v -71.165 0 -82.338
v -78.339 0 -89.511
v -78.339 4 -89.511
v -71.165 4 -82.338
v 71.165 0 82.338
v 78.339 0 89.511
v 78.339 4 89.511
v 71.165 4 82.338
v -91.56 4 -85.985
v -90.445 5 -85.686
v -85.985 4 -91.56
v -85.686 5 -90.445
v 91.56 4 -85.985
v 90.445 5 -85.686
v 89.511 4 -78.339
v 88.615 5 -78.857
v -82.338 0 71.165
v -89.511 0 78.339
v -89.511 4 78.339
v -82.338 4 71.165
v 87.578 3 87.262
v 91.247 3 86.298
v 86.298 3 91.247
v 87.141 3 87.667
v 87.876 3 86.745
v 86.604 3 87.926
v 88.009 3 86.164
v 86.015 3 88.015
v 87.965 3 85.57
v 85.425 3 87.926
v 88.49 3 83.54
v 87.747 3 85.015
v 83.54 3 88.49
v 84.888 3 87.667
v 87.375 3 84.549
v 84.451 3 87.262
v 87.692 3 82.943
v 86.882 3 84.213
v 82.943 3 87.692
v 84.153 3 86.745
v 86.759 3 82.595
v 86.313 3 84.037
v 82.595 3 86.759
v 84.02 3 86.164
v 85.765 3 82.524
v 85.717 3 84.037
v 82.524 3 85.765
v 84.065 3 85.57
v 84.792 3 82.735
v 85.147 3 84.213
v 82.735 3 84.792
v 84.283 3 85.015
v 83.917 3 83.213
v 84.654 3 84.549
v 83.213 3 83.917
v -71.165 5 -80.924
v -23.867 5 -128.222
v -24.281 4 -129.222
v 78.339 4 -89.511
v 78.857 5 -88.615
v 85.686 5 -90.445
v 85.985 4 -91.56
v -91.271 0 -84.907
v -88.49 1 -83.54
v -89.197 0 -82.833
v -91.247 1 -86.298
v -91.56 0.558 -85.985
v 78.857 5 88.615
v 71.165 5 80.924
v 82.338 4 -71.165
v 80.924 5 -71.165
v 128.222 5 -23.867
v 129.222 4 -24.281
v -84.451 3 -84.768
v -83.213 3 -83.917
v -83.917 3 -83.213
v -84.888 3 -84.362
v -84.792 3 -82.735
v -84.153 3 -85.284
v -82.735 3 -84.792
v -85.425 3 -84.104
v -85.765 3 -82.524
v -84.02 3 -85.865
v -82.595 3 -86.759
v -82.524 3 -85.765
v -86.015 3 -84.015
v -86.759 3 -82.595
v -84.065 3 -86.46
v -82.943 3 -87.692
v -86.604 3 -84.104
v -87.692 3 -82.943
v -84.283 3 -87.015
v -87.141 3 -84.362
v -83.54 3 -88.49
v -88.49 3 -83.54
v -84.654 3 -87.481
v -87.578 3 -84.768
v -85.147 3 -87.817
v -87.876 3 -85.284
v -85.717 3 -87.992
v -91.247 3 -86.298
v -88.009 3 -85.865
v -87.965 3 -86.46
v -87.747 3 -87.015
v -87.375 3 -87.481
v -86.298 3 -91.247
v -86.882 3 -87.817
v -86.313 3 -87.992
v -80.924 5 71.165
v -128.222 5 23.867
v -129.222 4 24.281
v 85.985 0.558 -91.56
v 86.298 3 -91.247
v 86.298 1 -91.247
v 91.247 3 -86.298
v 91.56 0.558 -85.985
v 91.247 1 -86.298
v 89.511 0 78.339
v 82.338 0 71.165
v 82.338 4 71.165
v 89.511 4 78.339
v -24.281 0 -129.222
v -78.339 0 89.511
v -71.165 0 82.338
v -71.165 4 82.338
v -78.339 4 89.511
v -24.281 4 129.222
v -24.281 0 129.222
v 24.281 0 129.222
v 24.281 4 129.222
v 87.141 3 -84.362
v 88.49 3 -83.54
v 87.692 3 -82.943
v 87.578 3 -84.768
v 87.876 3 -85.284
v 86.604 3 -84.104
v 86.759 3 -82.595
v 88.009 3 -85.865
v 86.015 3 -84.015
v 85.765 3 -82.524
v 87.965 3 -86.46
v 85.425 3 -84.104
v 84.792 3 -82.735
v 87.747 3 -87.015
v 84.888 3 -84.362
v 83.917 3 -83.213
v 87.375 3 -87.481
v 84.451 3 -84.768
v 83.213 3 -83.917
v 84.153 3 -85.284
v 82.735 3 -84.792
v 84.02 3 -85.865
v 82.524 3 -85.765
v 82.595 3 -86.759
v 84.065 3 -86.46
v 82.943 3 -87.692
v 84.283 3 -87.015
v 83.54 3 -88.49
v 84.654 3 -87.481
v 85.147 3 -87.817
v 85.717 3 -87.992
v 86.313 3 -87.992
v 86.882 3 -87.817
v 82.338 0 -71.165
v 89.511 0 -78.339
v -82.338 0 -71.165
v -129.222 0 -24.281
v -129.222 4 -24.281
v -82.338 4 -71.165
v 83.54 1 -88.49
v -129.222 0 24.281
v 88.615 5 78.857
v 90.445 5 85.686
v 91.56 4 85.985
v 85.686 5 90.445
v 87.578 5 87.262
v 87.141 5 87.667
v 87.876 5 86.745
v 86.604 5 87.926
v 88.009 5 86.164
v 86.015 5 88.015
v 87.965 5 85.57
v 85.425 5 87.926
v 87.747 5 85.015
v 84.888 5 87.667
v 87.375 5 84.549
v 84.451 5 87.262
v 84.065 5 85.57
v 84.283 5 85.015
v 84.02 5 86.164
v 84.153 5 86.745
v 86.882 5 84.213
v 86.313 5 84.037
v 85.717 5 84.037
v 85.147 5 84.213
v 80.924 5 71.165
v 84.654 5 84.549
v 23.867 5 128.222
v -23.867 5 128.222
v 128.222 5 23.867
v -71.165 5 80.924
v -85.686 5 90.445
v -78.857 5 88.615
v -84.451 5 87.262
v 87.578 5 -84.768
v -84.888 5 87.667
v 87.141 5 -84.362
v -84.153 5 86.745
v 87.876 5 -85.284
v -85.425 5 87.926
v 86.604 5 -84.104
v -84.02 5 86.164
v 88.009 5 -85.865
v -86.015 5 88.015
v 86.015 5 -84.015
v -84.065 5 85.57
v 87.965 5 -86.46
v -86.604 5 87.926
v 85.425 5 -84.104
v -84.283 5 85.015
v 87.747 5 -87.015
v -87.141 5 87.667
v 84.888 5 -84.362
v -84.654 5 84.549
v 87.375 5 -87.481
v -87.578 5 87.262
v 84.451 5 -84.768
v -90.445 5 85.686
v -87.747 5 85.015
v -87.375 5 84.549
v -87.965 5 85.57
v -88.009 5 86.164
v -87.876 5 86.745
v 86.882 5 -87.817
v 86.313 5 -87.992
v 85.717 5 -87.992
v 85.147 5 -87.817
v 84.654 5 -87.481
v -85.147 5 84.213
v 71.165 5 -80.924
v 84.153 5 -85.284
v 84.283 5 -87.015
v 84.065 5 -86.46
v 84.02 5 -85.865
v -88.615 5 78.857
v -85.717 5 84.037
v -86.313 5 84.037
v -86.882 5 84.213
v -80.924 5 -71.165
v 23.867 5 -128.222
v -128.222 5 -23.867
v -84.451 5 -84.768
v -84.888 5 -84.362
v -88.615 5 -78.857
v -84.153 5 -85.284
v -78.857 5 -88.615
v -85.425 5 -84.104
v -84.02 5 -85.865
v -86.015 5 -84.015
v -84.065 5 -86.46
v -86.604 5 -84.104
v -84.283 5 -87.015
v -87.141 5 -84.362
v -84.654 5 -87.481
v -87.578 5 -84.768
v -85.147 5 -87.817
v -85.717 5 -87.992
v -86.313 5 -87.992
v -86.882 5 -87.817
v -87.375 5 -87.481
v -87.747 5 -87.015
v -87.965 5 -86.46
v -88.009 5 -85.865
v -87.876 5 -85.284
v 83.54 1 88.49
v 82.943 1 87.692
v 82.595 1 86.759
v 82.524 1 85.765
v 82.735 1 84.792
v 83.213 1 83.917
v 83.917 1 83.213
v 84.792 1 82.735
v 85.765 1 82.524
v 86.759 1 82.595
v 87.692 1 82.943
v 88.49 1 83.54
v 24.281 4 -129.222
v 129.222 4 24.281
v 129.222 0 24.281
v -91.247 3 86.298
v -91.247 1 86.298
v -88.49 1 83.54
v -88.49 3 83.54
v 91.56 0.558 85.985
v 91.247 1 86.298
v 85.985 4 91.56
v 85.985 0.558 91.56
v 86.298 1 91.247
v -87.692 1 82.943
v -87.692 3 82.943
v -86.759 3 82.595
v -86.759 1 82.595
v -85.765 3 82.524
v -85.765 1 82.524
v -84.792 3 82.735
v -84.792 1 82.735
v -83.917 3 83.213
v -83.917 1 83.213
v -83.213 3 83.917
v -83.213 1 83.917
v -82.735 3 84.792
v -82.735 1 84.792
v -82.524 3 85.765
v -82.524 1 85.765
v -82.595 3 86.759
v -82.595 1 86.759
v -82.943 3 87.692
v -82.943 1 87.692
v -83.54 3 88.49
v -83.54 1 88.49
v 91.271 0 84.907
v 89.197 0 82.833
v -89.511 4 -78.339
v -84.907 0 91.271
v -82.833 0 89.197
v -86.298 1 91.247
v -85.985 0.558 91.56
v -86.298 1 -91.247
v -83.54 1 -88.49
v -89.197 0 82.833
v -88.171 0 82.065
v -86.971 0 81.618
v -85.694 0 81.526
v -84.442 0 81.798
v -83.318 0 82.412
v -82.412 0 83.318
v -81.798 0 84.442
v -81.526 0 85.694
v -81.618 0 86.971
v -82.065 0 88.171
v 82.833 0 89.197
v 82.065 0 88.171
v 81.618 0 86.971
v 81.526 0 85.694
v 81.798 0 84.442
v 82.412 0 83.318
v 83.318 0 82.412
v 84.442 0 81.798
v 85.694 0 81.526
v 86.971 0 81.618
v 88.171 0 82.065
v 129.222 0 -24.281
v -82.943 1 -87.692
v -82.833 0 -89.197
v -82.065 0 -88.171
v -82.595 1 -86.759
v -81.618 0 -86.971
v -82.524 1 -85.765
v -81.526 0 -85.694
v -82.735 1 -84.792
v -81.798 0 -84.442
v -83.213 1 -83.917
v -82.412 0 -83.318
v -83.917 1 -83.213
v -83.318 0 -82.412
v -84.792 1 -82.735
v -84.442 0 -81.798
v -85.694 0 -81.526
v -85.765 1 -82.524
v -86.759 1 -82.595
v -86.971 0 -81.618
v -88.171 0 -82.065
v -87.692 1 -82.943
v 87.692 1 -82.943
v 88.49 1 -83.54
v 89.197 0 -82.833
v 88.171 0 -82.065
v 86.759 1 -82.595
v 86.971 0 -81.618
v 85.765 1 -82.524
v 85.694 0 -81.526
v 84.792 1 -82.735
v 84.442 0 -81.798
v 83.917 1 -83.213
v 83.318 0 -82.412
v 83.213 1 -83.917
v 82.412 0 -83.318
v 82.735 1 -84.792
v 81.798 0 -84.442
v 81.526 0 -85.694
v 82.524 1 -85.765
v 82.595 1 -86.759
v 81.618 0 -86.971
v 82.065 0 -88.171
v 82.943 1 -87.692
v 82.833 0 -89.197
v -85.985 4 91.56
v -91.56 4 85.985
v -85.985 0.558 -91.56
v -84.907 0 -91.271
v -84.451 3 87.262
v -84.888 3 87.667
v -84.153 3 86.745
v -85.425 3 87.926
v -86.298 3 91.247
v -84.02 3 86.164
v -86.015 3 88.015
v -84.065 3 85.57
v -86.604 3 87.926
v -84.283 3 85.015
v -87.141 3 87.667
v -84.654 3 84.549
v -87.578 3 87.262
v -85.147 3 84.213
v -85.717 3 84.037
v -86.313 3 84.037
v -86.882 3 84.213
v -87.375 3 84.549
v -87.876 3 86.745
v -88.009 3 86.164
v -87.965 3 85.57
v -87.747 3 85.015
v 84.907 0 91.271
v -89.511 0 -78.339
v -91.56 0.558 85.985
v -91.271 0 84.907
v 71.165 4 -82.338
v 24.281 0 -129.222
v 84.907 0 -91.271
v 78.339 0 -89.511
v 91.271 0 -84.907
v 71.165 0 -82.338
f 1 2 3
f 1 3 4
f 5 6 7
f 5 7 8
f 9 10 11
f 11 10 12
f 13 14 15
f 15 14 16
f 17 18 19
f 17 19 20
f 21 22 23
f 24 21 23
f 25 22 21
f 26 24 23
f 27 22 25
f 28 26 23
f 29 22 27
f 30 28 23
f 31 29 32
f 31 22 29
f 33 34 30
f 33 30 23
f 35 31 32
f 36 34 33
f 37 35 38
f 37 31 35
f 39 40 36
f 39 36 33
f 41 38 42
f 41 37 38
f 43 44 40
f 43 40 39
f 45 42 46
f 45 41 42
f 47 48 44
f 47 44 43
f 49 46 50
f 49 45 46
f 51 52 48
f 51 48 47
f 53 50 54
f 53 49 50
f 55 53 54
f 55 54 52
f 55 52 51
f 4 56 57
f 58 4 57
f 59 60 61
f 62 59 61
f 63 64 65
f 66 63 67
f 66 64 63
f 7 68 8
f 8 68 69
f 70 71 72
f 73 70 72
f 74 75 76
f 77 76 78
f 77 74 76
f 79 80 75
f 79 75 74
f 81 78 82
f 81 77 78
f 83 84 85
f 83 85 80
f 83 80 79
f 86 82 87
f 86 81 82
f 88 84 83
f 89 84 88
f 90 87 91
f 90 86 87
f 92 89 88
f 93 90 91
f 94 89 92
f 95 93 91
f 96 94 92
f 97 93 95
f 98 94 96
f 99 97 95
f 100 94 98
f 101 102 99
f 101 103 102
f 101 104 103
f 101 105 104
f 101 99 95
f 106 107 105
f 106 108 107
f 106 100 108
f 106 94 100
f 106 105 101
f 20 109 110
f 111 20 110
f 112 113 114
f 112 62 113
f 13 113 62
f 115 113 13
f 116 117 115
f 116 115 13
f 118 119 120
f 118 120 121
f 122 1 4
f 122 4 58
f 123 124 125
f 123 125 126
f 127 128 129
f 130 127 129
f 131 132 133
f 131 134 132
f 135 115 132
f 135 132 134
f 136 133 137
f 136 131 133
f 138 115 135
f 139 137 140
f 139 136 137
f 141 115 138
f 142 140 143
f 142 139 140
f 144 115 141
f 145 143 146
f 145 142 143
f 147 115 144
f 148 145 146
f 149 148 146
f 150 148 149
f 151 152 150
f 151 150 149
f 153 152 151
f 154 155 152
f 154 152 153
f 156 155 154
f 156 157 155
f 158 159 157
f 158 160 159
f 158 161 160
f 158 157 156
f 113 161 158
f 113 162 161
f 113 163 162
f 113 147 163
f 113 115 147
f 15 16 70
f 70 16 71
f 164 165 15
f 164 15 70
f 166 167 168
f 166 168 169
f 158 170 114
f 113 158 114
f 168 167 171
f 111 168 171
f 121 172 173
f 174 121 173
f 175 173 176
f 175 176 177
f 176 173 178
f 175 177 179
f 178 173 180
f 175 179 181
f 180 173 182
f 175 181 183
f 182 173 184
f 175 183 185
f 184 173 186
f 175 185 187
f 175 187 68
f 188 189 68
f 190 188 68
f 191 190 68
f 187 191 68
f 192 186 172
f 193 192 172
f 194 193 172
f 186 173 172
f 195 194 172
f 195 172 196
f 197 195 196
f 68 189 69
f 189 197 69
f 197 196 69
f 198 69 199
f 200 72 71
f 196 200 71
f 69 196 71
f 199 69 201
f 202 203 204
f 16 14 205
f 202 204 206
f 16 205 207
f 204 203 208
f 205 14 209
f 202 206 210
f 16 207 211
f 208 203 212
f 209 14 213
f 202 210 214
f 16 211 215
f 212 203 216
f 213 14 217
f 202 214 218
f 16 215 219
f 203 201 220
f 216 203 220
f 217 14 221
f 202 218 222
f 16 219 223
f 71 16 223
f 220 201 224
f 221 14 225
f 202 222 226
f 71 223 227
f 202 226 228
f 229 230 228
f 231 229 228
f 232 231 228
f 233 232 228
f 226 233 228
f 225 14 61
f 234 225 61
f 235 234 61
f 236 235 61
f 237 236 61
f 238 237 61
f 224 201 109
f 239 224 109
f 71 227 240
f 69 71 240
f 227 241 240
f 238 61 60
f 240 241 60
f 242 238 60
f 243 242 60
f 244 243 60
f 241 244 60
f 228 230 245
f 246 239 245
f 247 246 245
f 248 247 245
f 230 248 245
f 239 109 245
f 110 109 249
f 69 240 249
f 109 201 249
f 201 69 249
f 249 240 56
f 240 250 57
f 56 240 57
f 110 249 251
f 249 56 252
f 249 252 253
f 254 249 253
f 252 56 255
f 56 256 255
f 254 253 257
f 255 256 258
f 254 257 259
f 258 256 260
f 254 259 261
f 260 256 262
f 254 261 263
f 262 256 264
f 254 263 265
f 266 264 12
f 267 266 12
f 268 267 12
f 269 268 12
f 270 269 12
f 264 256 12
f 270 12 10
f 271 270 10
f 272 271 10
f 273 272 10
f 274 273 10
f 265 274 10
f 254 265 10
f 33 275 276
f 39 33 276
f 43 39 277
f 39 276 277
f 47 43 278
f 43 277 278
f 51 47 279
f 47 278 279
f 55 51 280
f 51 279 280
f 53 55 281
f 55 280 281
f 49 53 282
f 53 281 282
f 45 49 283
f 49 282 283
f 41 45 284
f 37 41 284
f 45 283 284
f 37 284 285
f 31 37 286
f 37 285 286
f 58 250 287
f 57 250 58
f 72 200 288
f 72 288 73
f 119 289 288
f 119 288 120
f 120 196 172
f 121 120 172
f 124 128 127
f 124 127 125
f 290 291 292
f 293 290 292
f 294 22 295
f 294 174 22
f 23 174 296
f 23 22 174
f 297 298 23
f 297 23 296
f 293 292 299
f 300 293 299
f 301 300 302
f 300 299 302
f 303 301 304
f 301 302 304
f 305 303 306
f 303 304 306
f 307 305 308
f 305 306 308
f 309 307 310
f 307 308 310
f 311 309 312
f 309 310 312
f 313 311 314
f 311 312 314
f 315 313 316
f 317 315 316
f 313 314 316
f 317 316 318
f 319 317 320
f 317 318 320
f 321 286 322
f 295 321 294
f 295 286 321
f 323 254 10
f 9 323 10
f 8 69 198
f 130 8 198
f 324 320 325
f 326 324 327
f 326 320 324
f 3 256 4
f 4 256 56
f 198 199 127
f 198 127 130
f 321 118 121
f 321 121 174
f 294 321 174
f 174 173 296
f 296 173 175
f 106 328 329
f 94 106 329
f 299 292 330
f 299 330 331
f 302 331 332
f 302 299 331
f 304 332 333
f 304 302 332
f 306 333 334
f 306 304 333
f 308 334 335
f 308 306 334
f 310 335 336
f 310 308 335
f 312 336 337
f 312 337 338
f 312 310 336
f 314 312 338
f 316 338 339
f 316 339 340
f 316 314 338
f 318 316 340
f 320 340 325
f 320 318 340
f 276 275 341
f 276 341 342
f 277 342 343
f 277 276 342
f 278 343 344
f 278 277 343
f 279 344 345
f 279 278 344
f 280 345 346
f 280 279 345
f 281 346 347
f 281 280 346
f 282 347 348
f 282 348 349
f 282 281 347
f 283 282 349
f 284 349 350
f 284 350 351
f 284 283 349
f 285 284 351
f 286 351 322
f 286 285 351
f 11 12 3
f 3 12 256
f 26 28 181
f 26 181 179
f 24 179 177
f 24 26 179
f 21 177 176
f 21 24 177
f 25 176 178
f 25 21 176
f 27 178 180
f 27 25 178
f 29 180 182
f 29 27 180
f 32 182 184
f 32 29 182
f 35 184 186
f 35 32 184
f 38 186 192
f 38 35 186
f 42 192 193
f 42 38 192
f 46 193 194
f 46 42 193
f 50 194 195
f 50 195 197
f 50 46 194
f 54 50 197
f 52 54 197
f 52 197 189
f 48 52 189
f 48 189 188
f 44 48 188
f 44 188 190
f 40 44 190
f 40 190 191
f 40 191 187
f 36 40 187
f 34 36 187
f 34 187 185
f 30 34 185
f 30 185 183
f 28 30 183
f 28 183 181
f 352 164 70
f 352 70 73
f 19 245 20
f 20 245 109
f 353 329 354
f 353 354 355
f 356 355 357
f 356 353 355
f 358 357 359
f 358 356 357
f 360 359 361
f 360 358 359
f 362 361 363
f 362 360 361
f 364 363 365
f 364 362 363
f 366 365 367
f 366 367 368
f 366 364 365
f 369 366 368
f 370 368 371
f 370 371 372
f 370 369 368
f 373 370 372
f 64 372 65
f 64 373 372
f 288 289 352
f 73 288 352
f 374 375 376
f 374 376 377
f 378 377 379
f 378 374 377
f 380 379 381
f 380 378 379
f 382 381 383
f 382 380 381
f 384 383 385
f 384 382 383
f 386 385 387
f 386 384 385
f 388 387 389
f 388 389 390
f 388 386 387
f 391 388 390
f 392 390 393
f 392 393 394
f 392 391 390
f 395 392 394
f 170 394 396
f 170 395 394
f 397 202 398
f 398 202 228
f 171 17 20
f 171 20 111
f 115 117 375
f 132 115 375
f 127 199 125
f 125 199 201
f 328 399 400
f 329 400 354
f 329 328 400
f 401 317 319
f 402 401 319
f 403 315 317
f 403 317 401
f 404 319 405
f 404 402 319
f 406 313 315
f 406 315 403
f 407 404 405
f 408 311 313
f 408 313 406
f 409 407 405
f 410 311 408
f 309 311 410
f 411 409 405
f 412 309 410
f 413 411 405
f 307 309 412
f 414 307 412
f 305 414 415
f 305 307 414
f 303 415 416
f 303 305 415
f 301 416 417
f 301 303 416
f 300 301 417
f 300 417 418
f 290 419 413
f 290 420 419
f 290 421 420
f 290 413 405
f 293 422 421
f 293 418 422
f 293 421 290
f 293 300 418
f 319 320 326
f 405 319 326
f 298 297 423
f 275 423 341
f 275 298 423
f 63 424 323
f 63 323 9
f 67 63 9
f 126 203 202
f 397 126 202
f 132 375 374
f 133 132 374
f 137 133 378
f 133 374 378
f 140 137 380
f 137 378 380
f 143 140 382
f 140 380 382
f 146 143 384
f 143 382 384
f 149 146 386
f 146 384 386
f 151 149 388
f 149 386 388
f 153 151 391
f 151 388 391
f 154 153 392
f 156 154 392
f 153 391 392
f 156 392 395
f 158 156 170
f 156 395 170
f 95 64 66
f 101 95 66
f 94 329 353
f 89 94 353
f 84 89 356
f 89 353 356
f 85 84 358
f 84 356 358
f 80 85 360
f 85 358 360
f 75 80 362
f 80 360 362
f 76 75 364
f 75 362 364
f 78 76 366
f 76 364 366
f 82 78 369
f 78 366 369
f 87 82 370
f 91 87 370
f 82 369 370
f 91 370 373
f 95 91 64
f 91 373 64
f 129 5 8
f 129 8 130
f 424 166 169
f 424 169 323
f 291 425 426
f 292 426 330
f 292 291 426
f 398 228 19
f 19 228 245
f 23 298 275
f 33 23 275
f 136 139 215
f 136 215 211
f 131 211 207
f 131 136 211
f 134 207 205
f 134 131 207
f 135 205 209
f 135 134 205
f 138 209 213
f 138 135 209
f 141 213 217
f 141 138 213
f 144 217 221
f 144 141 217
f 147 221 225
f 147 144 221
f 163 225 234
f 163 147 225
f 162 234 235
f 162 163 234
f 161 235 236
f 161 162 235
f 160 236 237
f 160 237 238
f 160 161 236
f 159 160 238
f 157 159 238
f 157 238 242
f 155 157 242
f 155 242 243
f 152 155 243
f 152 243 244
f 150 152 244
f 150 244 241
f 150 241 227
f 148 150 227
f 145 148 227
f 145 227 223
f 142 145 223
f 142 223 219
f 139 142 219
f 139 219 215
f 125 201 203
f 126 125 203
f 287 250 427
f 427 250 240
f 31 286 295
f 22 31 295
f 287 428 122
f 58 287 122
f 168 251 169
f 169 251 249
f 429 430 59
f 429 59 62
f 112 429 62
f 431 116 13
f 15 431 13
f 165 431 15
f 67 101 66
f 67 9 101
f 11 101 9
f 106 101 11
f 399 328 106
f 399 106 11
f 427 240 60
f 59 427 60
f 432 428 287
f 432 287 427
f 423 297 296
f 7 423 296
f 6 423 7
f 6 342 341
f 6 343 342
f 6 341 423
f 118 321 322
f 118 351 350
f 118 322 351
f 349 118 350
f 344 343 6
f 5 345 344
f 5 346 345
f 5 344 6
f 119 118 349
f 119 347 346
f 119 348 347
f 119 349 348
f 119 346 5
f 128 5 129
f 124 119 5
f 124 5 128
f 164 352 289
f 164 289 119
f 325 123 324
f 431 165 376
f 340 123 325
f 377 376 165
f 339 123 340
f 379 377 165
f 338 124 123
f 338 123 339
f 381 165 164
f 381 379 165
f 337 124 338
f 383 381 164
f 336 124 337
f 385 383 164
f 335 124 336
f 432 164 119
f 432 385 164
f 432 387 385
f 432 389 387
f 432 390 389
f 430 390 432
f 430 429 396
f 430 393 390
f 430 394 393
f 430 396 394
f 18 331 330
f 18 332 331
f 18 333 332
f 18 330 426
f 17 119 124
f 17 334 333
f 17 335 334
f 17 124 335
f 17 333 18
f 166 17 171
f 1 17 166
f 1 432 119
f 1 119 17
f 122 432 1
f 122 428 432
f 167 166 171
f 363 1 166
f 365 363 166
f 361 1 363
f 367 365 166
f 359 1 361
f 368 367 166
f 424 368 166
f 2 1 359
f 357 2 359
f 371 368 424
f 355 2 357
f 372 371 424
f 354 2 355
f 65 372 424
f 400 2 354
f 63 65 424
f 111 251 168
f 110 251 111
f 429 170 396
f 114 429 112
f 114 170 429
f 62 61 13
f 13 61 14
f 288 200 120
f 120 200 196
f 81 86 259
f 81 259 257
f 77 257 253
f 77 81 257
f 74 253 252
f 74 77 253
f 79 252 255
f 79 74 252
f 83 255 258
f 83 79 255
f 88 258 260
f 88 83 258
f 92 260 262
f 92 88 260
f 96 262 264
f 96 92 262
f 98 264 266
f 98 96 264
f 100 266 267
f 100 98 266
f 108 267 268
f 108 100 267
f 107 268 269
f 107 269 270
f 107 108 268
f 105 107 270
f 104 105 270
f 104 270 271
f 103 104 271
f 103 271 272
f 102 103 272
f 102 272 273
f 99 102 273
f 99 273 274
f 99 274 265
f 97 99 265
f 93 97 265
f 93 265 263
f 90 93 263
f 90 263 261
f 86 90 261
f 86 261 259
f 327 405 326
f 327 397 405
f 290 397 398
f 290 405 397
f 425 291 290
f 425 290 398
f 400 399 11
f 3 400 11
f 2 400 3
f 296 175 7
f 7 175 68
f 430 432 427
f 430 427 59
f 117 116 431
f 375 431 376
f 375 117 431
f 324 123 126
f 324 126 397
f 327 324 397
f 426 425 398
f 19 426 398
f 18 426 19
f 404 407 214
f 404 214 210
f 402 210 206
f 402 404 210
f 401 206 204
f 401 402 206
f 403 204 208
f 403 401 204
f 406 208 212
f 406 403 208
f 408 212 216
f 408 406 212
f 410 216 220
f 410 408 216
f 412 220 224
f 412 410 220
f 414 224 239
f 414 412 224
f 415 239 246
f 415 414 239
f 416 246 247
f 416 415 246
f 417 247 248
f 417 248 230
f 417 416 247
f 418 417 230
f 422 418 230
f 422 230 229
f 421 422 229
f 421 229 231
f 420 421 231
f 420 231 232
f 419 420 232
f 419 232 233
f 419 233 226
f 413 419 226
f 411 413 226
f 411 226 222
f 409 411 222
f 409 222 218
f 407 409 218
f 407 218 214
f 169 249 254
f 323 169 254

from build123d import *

# Parameters (mm, degrees)
SKETCH2_R                            = 2
SKETCH2_R_2                          = 1.999999996
MAIN_FLOOR_EXTRUDE_DEPTH             = 5
MAIN_FLOOR_CHAMFER_SIZE              = 1
MOUNT_SCREW_COUNTERSINK_DEPTH        = 3
MOUNT_SCREW_COUNTERSINK_CHAMFER_SIZE = 1


with BuildPart() as part:
    # Sketch2 → Main Floor Extrude (new body)
    with BuildSketch(Plane(origin=(0, 0, 0), x_dir=(1, 0, 0), z_dir=(0, 1, 0))):
        Polygon((129.222330464, 0), (129.222330464, -24.28090912), (82.337763357, -71.165476227), (89.511362957, -78.339075827), (91.560037368, -85.984832777), (85.984832777, -91.560037368), (78.339075822, -89.511362977), (71.165476214, -82.33776337), (24.280909108, -129.222330477), (0, -129.222330477), (-24.28090912, -129.222330477), (-71.165476227, -82.33776337), (-78.339075827, -89.51136297), (-85.984832777, -91.560037381), (-91.560037368, -85.984832789), (-89.511362977, -78.339075834), (-82.33776337, -71.165476227), (-129.222330477, -24.28090912), (-129.222330477, -1.3e-08), (-129.222330477, 24.280909108), (-82.33776337, 71.165476214), (-89.51136297, 78.339075814), (-91.560037381, 85.984832764), (-85.984832789, 91.560037355), (-78.339075834, 89.511362964), (-71.165476227, 82.337763357), (-24.28090912, 129.222330464), (-1.3e-08, 129.222330464), (24.280909108, 129.222330464), (71.165476214, 82.337763357), (78.339075814, 89.511362957), (85.984832764, 91.560037368), (91.560037355, 85.984832777), (89.511362964, 78.339075822), (82.337763357, 71.165476214), (129.222330464, 24.280909108), align=None)
        with Locations(Location((86.014718626, -86.014718626, 0), (0, 0, 270))):
            Circle(SKETCH2_R, mode=Mode.SUBTRACT)
        with Locations(Location((-86.014718626, -86.014718639, 0), (0, 0, 270))):
            Circle(SKETCH2_R, mode=Mode.SUBTRACT)
        with Locations(Location((-86.014718639, 86.014718613, 0), (0, 0, 270))):
            Circle(SKETCH2_R, mode=Mode.SUBTRACT)
        with Locations(Location((86.014718613, 86.014718626, 0), (0, 0, 270))):
            Circle(SKETCH2_R_2, mode=Mode.SUBTRACT)
    extrude(amount=MAIN_FLOOR_EXTRUDE_DEPTH)

    # Main Floor Chamfer
    main_floor_chamfer_edges = [part.edges().sort_by_distance(p)[0] for p in [
        (-74.752276027, 5, 85.92456317),
        (-47.723192674, 5, 105.780046923),
        (-6e-09, 5, 129.222330477),
        (47.723192661, 5, 105.780046923),
        (74.752276018, 5, 85.924563174),
        (82.161954299, 5, 90.535700173),
        (88.772435072, 5, 88.772435072),
        (85.924563161, 5, -74.752276018),
        (90.535700163, 5, 82.161954302),
        (85.924563157, 5, 74.752276027),
        (105.780046911, 5, 47.723192674),
        (90.53570016, 5, -82.161954299),
        (88.77243506, 5, -88.772435072),
        (82.161954289, 5, -90.535700163),
        (74.752276014, 5, -85.924563157),
        (47.723192661, 5, -105.780046911),
        (-6e-09, 5, -129.222330464),
        (-47.723192674, 5, -105.780046911),
        (-74.752276031, 5, -85.924563161),
        (129.222330464, 5, 6e-09),
        (-82.161954312, 5, -90.53570016),
        (-88.772435085, 5, -88.77243506),
        (-90.535700175, 5, -82.161954289),
        (-85.92456317, 5, -74.752276014),
        (-105.780046923, 5, -47.723192661),
        (-129.222330477, 5, 6e-09),
        (-105.780046923, 5, 47.723192674),
        (-85.924563174, 5, 74.752276031),
        (-90.535700173, 5, 82.161954312),
        (105.780046911, 5, -47.723192661),
        (-88.772435072, 5, 88.772435085),
        (-82.161954302, 5, 90.535700175),
    ]]
    chamfer(main_floor_chamfer_edges, length=MAIN_FLOOR_CHAMFER_SIZE)

    # Sketch3 → Mount Screw Countersink (cut)
    with BuildSketch(Plane(origin=(0, 0, 0), x_dir=(-1, 0, 0), z_dir=(0, -1, 0))):
        with BuildLine():
            Line((91.247308807, -86.297561351), (88.48959236, -83.539844904))
            ThreePointArc((88.48959236, -83.539844904), (83.539844892, -83.539844904), (83.539844892, -88.489592373))
            Line((83.539844892, -88.489592373), (86.297561338, -91.247308819))
            Line((86.297561338, -91.247308819), (91.247308807, -86.297561351))
        make_face()
        with BuildLine():
            Line((-86.297561351, -91.247308807), (-83.539844904, -88.48959236))
            ThreePointArc((-83.539844904, -88.48959236), (-83.539844904, -83.539844892), (-88.489592373, -83.539844892))
            Line((-88.489592373, -83.539844892), (-91.247308819, -86.297561338))
            Line((-91.247308819, -86.297561338), (-86.297561351, -91.247308807))
        make_face()
        with BuildLine():
            Line((-91.247308807, 86.297561351), (-88.48959236, 83.539844904))
            ThreePointArc((-88.48959236, 83.539844904), (-83.539844892, 83.539844904), (-83.539844892, 88.489592373))
            Line((-83.539844892, 88.489592373), (-86.297561338, 91.247308819))
            Line((-86.297561338, 91.247308819), (-91.247308807, 86.297561351))
        make_face()
        with BuildLine():
            Line((86.297561351, 91.247308807), (83.539844904, 88.48959236))
            ThreePointArc((83.539844904, 88.48959236), (83.539844904, 83.539844892), (88.489592373, 83.539844892))
            Line((88.489592373, 83.539844892), (91.247308819, 86.297561338))
            Line((91.247308819, 86.297561338), (86.297561351, 91.247308807))
        make_face()
    extrude(amount=-MOUNT_SCREW_COUNTERSINK_DEPTH, mode=Mode.SUBTRACT)

    # Mount Screw Countersink Chamfer
    mount_screw_countersink_chamfer_edges = [part.edges().sort_by_distance(p)[0] for p in [
        (-84.918703128, 0, -89.868450583),
        (-89.868450596, 0, -84.918703115),
        (-83.539844904, 0, -83.539844892),
        (89.868450583, 0, -84.918703128),
        (84.918703115, 0, -89.868450596),
        (83.539844892, 0, -83.539844904),
        (84.918703128, 0, 89.868450583),
        (89.868450596, 0, 84.918703115),
        (83.539844904, 0, 83.539844892),
        (-89.868450583, 0, 84.918703128),
        (-84.918703115, 0, 89.868450596),
        (-83.539844892, 0, 83.539844904),
    ]]
    chamfer(mount_screw_countersink_chamfer_edges, length=MOUNT_SCREW_COUNTERSINK_CHAMFER_SIZE)


solid = part.part
